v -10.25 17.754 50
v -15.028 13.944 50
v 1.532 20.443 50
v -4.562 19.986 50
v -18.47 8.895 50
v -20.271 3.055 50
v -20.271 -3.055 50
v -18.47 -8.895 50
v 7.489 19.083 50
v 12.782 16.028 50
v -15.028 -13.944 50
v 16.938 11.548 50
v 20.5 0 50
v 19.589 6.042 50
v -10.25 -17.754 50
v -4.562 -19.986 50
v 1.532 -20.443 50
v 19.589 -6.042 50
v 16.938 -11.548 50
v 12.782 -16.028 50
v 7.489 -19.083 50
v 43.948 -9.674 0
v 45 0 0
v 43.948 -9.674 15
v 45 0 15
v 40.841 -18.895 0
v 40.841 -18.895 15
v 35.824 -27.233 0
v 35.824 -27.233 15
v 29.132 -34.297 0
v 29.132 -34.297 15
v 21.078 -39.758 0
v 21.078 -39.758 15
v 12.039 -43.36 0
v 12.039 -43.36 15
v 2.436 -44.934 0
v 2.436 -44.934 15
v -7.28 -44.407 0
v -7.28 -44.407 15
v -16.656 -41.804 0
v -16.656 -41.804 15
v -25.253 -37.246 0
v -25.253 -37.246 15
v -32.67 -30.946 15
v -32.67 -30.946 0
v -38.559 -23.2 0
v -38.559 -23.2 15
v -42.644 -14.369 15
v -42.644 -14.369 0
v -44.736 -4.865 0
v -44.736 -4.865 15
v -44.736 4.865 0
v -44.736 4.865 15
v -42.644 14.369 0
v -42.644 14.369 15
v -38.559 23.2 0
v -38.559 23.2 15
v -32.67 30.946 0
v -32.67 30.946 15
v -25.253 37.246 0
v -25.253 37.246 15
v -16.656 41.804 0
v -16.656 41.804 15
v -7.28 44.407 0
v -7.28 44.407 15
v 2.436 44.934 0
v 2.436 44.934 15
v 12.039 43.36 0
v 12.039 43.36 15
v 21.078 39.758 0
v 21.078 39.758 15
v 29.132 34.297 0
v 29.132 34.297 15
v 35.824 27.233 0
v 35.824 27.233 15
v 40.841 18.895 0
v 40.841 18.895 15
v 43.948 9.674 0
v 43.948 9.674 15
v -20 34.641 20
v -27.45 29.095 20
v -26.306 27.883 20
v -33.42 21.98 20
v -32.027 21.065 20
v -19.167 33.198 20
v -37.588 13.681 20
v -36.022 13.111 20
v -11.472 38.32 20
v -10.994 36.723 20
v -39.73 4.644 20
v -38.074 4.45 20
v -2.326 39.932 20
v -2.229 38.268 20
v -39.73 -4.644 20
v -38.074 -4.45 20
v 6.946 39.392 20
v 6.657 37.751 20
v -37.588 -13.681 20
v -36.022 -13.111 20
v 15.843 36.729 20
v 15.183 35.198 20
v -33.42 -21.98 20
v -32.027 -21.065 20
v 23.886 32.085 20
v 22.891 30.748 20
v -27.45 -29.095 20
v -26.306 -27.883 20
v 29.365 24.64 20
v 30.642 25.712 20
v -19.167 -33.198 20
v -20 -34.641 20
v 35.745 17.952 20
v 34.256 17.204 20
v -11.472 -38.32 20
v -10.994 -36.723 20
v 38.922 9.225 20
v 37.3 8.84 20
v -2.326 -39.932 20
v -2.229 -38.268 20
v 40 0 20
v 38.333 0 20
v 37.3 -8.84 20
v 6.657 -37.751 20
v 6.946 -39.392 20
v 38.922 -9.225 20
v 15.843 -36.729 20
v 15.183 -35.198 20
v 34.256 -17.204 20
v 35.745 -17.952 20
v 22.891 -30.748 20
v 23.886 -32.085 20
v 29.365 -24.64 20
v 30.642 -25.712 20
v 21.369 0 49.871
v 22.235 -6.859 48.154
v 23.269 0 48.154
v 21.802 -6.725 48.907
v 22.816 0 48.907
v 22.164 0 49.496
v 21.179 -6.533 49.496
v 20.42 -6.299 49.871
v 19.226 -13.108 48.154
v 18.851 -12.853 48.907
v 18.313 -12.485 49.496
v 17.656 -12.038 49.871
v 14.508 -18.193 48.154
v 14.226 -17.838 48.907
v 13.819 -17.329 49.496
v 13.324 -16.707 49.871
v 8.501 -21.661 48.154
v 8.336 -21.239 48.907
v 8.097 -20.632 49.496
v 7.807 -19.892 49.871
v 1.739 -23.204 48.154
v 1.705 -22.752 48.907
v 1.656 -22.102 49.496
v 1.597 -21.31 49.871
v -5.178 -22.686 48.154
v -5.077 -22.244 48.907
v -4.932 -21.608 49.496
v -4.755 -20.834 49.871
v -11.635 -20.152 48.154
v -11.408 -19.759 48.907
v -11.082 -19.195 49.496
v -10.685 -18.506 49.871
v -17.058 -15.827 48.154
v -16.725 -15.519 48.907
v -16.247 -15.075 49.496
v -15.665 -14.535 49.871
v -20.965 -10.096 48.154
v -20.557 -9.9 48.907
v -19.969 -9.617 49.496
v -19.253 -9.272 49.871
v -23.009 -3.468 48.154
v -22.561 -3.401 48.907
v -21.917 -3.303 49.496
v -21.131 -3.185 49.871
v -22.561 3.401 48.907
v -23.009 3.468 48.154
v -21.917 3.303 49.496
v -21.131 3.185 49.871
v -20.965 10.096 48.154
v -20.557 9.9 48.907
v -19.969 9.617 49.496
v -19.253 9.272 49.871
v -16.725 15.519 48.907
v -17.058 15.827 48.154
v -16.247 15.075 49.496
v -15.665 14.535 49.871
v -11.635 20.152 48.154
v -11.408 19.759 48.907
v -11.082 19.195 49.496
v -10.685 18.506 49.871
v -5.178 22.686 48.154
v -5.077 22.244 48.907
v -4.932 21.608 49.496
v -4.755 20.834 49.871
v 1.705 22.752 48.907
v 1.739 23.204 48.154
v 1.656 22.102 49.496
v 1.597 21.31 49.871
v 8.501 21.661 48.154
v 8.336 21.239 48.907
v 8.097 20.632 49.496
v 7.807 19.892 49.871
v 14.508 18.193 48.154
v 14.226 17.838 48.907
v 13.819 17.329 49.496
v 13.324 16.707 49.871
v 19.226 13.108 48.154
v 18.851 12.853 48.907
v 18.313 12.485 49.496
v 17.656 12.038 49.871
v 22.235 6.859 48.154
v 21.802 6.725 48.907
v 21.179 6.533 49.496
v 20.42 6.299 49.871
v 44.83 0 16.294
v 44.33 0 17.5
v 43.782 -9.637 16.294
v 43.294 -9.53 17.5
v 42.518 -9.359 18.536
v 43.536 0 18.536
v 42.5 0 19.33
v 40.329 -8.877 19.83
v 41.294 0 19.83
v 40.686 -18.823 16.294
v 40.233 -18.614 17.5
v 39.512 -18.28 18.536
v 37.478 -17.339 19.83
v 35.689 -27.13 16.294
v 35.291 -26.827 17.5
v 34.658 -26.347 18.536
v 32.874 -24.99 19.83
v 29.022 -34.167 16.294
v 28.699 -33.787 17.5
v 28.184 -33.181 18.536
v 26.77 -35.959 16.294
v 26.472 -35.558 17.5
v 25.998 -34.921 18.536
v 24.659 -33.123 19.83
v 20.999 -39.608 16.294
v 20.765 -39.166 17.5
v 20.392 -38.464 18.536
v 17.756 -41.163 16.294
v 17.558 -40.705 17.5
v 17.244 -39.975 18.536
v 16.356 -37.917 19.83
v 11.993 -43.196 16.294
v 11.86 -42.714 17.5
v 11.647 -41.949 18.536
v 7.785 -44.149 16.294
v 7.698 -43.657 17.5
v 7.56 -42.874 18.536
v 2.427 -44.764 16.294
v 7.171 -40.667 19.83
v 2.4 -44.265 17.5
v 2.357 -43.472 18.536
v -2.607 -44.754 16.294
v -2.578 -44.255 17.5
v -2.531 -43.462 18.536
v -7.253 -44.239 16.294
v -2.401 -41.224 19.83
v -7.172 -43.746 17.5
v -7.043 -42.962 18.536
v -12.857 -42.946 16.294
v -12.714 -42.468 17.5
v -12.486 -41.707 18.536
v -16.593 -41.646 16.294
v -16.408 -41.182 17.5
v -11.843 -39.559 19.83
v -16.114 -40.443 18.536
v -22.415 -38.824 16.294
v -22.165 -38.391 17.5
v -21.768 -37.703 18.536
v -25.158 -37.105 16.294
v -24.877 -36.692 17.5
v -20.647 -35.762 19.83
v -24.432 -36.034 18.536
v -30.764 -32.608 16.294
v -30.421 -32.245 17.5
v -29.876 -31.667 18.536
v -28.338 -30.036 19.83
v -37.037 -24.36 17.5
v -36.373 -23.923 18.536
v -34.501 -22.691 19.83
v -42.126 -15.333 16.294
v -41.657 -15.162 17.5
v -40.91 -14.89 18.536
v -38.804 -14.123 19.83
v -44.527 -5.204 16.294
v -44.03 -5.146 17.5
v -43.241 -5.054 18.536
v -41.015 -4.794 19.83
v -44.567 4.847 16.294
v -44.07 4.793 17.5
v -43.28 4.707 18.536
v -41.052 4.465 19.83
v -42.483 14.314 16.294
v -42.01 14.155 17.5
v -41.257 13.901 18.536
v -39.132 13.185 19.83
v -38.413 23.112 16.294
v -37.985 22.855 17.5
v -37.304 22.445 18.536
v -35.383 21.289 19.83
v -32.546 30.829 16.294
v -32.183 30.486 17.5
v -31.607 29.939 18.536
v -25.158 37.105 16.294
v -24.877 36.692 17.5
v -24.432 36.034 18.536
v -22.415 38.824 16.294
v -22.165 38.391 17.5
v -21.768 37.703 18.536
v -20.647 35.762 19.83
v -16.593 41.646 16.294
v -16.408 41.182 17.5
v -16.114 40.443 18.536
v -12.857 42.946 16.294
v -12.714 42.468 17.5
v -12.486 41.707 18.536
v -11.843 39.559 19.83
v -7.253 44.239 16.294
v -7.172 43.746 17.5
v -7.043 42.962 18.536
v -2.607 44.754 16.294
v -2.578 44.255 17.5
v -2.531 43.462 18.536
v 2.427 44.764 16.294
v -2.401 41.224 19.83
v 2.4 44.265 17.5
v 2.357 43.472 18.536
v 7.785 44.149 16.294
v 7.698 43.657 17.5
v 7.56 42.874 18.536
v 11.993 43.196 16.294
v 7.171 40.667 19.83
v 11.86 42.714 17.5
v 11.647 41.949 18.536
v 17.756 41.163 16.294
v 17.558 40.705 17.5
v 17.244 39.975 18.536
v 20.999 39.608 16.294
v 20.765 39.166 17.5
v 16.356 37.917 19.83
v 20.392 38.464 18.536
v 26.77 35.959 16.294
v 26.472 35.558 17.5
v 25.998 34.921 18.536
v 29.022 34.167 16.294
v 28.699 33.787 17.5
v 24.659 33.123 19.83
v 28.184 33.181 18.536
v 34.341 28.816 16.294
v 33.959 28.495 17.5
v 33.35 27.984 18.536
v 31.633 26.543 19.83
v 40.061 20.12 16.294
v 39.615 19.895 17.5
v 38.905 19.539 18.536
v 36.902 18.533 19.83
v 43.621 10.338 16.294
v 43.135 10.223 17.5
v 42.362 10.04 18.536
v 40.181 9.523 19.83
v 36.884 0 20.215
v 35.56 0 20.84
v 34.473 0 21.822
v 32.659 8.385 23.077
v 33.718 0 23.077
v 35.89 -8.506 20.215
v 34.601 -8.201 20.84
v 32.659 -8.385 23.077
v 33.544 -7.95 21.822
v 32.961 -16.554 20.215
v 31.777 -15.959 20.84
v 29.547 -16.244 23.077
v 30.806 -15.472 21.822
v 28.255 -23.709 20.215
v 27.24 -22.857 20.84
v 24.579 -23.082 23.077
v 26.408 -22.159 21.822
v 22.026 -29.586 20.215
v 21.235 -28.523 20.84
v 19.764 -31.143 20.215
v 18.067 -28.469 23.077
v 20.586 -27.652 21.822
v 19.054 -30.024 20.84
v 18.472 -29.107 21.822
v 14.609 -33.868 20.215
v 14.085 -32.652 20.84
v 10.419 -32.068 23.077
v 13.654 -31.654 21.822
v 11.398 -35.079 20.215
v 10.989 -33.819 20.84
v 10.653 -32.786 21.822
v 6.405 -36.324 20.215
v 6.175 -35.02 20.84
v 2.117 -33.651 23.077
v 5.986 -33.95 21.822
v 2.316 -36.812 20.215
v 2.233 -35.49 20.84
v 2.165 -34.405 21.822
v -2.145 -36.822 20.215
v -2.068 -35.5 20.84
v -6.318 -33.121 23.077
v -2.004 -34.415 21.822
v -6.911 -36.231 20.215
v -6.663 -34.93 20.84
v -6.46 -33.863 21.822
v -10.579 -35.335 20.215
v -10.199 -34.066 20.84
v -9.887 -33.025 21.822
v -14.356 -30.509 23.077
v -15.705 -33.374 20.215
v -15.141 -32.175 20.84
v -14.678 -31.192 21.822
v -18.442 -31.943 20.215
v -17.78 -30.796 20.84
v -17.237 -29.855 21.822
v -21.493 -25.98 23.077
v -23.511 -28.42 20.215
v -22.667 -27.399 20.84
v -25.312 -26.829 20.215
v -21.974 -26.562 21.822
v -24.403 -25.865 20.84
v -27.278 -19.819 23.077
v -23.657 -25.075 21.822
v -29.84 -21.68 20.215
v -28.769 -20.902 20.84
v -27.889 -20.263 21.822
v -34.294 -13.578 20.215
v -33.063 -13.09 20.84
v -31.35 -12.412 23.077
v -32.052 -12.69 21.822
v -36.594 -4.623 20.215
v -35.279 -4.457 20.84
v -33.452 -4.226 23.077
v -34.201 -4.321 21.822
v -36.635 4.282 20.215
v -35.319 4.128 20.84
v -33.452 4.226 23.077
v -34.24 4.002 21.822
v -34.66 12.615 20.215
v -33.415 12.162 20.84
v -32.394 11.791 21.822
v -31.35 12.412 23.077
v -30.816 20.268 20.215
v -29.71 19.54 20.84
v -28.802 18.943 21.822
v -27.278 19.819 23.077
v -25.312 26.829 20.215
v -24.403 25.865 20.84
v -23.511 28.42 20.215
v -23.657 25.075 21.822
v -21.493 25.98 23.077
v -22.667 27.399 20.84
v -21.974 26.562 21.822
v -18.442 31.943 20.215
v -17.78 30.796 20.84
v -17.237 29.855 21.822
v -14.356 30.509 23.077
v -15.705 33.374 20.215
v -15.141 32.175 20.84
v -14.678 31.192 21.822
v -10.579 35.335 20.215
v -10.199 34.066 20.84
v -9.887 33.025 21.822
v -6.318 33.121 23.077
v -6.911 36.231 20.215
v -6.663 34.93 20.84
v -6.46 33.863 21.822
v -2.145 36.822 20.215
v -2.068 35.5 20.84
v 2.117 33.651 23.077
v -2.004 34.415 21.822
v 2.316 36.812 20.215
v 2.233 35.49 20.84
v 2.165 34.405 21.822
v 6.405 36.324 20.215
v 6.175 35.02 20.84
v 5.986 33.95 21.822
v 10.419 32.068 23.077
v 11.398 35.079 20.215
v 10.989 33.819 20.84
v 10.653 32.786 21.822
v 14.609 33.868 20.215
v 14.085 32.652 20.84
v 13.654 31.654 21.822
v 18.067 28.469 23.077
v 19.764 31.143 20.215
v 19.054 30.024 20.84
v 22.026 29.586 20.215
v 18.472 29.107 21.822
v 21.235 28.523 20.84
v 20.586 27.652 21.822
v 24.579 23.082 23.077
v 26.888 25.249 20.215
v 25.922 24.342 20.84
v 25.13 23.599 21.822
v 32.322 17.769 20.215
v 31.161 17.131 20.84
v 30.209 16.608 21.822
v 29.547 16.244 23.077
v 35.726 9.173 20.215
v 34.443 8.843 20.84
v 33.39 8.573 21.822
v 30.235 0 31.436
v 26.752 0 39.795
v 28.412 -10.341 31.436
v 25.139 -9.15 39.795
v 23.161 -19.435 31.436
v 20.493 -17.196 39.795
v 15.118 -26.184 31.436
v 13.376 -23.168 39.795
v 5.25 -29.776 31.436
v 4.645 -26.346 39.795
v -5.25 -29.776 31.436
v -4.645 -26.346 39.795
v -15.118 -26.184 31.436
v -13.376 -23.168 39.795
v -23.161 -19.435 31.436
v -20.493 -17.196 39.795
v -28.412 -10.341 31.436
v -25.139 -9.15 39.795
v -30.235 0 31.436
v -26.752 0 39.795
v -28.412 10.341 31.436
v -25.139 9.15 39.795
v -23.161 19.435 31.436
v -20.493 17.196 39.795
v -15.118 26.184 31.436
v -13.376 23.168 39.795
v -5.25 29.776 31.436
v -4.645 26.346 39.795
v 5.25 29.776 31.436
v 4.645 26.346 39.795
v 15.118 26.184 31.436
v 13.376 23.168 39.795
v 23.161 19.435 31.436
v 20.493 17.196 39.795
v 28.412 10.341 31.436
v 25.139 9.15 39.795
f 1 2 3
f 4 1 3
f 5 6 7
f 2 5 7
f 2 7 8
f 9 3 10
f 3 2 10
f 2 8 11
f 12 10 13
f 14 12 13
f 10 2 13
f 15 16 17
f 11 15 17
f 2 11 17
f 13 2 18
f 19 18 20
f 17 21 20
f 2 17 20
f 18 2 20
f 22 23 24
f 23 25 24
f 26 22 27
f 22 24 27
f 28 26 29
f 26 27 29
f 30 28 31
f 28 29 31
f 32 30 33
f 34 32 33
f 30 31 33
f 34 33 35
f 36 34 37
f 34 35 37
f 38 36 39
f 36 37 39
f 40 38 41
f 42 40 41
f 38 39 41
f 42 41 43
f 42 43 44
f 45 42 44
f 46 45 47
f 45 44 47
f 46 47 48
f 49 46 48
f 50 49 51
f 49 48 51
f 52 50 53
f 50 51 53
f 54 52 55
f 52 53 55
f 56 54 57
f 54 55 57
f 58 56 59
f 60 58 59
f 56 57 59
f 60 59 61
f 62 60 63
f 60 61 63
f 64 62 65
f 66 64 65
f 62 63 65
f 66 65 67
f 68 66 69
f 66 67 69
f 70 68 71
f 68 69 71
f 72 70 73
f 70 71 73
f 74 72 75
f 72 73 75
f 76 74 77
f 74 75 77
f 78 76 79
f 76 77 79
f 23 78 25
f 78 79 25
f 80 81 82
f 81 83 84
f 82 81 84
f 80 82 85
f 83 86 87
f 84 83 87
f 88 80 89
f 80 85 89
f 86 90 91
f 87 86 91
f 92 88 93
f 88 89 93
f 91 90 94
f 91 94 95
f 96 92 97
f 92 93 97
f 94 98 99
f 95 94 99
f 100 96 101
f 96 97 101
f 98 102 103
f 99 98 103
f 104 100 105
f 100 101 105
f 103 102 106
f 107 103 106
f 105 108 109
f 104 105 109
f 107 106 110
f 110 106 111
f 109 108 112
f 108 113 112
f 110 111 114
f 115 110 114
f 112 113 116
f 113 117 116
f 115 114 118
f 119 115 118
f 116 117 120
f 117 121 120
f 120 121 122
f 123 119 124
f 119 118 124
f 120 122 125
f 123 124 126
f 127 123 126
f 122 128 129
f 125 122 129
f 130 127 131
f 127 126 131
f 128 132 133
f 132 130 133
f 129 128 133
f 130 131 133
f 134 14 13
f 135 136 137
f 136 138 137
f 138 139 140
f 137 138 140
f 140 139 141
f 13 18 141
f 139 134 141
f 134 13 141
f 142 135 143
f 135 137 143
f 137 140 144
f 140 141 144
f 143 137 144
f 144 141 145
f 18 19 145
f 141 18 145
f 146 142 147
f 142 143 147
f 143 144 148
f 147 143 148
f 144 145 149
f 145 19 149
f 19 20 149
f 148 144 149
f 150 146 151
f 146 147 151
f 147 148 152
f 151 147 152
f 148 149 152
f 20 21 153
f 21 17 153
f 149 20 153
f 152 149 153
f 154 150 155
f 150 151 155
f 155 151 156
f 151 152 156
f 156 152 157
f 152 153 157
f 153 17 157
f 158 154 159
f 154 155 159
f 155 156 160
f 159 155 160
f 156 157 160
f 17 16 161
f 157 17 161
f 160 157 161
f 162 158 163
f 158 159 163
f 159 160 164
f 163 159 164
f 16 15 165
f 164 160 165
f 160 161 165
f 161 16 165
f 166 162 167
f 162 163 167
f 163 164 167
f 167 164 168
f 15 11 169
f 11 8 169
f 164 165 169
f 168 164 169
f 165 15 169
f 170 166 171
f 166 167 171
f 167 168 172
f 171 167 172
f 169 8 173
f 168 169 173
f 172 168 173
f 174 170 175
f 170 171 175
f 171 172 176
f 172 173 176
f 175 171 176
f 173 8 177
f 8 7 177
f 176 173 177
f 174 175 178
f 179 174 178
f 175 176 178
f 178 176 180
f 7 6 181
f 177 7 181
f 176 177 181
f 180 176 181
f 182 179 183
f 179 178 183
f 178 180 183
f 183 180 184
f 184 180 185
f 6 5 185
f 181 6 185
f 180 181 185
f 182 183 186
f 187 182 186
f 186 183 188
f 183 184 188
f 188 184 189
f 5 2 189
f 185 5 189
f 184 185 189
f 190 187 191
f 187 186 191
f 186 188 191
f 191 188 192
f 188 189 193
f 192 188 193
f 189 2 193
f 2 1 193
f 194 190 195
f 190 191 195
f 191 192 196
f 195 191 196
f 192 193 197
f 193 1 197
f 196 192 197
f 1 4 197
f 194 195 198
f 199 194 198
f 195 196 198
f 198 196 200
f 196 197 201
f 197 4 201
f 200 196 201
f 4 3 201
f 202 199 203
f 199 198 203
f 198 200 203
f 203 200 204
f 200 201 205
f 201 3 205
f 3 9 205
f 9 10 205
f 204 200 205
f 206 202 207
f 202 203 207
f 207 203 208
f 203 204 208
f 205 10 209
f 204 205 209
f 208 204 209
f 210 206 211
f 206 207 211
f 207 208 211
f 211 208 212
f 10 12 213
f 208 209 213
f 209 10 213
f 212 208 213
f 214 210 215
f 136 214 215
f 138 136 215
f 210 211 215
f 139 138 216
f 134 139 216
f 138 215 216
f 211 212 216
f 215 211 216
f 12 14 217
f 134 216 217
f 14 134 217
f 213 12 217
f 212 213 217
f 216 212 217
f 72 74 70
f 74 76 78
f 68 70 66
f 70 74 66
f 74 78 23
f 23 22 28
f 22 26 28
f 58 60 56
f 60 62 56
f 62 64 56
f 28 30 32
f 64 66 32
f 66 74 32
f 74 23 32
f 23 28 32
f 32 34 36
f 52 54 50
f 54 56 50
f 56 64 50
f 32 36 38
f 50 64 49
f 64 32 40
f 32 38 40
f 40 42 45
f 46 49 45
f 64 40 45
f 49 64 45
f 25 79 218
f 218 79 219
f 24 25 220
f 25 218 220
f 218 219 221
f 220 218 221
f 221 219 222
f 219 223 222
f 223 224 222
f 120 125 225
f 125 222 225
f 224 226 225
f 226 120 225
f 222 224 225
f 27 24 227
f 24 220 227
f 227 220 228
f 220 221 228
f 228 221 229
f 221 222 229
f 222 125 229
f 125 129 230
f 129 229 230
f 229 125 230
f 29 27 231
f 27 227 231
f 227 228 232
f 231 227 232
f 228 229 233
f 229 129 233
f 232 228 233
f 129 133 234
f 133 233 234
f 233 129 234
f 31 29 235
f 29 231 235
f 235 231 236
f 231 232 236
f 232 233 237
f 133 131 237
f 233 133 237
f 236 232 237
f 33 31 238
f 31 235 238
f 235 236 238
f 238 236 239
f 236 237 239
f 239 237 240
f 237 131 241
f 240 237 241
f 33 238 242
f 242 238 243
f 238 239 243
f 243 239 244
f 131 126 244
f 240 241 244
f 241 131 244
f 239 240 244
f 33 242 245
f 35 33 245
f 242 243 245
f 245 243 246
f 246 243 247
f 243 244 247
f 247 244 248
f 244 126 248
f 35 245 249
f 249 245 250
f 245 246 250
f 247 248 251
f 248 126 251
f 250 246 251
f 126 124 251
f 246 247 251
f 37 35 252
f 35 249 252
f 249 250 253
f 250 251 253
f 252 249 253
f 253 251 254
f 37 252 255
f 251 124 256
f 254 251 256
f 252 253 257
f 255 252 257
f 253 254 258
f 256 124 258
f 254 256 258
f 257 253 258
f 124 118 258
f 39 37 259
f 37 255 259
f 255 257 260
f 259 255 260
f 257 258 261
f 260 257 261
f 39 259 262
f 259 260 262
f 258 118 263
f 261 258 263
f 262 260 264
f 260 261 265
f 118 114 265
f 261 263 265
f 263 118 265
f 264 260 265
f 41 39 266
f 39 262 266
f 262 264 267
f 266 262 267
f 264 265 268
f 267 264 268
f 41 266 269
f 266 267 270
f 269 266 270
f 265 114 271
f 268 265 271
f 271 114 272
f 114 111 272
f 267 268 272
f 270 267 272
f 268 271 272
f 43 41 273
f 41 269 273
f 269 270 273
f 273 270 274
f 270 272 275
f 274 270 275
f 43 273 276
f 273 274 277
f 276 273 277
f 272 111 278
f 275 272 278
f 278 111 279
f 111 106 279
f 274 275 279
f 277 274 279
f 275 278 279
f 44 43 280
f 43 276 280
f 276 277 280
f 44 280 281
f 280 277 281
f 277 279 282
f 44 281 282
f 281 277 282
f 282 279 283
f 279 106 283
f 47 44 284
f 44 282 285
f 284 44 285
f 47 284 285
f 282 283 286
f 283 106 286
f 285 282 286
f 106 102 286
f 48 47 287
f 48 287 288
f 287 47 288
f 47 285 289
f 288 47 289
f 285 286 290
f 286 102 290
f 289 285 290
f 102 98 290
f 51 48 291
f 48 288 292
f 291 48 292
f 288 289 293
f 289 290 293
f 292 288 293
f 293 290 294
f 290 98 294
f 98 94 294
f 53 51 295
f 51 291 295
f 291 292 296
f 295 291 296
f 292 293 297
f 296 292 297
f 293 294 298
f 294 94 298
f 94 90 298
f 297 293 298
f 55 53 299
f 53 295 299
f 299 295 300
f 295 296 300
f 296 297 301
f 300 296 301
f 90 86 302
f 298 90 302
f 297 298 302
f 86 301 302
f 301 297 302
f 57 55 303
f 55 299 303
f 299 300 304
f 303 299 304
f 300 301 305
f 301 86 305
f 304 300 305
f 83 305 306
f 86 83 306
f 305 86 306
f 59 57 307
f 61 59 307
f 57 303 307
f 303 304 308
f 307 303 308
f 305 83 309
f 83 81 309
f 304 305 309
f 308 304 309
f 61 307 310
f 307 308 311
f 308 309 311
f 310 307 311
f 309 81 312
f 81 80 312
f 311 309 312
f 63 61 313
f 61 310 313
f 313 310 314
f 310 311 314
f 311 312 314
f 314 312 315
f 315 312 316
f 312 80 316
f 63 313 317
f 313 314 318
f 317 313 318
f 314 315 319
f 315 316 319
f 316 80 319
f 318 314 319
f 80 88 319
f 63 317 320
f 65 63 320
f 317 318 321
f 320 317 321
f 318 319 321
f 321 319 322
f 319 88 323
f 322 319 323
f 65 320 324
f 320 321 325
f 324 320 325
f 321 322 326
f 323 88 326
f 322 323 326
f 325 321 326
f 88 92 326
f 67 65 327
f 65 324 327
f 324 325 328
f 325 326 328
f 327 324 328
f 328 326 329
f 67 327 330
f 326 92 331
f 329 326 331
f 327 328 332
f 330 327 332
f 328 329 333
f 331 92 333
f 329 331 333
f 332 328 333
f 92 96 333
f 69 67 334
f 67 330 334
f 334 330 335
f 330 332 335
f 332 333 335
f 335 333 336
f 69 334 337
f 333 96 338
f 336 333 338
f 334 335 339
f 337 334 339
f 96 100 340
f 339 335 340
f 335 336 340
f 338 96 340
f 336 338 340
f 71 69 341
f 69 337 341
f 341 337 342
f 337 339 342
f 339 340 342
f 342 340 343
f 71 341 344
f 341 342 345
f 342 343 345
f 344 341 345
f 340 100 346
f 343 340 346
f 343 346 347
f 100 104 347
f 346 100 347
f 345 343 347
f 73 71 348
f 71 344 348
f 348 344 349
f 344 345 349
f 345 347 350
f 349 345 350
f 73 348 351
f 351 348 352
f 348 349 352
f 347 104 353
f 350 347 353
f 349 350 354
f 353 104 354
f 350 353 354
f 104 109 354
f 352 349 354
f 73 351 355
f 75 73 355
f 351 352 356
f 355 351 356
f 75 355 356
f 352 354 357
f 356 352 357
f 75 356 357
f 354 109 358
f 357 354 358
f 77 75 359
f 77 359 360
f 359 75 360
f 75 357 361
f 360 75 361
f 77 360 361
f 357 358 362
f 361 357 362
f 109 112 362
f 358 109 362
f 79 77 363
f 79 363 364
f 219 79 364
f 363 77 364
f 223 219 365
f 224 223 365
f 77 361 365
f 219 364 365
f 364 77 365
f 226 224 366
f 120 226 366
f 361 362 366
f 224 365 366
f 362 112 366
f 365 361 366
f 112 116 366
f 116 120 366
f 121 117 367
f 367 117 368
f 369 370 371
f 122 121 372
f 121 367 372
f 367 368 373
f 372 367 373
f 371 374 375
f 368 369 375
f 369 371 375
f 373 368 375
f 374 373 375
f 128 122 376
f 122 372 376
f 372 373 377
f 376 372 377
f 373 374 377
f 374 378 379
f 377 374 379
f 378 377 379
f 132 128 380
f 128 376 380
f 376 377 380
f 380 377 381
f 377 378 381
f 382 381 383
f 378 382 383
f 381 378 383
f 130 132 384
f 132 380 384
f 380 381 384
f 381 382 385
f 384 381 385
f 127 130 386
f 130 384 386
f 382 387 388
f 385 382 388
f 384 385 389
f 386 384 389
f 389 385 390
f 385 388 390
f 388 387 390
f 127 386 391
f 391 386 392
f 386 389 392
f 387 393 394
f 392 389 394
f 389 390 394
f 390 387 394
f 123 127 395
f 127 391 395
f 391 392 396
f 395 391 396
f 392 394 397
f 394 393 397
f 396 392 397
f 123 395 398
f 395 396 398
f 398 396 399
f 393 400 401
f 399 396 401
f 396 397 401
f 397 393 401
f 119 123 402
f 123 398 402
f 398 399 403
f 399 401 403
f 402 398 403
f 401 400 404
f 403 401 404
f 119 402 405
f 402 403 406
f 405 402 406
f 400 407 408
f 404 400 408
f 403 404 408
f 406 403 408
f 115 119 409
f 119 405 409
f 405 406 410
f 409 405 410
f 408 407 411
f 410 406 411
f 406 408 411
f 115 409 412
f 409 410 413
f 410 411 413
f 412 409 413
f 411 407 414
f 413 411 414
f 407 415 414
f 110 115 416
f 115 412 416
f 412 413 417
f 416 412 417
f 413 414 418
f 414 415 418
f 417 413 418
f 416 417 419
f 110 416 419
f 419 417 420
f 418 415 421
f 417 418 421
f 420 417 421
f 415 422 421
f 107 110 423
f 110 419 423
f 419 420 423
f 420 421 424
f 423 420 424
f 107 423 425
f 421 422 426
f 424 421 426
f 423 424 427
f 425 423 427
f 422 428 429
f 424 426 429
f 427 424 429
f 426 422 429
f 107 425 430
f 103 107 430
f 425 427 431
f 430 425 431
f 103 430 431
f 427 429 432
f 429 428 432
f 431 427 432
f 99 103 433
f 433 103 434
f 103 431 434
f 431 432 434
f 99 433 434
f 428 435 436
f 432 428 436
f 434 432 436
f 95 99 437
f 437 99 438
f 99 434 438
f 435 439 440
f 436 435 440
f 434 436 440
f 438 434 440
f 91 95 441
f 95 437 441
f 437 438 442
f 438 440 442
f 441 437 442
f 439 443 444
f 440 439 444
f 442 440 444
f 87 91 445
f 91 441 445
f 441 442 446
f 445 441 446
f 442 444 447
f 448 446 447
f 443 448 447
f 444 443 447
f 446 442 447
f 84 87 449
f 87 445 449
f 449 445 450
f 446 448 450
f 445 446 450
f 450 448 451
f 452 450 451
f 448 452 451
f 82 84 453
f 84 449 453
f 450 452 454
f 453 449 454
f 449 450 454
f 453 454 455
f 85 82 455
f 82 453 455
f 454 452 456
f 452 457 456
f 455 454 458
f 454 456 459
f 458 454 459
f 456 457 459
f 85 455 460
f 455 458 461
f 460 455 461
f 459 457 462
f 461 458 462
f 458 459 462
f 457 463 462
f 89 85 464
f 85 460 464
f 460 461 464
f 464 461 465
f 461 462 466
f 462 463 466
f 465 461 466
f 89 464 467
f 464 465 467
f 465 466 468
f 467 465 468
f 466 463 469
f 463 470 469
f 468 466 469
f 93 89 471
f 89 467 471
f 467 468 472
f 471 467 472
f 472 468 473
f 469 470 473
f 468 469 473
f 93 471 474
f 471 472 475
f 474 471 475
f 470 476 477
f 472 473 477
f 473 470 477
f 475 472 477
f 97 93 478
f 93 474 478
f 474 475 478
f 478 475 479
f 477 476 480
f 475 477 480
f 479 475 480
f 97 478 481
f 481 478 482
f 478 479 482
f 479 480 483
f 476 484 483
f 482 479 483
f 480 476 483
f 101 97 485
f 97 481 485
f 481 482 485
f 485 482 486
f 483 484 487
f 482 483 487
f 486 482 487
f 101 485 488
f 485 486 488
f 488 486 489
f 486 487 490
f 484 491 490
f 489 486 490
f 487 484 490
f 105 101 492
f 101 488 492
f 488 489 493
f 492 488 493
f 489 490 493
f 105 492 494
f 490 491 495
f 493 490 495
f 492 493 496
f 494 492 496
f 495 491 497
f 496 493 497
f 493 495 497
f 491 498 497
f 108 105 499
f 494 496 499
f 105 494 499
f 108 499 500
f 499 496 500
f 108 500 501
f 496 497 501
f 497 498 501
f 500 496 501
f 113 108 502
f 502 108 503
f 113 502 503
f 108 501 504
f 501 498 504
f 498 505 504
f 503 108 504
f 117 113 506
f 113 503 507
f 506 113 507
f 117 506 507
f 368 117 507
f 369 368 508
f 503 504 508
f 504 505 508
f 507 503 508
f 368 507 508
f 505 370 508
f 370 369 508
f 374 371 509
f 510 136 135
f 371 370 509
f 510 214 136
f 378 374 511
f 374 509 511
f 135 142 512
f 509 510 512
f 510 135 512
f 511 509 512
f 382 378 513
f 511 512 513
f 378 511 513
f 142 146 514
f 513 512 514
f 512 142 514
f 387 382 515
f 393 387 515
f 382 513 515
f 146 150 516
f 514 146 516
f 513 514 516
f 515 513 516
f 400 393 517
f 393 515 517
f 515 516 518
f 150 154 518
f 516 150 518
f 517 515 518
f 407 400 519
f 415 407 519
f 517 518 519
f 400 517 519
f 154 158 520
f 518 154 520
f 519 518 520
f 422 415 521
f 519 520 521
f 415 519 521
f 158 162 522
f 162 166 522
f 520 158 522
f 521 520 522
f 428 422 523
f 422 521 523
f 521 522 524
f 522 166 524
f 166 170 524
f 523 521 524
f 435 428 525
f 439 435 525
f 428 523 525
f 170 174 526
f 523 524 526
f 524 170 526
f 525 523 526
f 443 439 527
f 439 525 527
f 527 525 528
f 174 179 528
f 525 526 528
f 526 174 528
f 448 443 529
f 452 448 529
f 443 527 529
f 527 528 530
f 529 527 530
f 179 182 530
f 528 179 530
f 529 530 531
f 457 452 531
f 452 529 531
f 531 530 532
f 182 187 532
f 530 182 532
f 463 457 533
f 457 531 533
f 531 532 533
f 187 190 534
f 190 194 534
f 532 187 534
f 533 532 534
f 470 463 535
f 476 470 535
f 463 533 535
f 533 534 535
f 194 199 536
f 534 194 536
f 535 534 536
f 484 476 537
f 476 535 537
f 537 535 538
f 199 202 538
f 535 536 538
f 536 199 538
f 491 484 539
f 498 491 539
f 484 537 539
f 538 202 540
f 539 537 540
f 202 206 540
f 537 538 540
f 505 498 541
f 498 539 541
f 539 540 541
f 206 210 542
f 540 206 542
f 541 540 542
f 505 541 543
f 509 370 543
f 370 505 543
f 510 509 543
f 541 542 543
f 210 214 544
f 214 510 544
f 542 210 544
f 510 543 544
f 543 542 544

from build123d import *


with BuildPart() as f1:
    # F0 (on Front) → F1 (revolve)
    with BuildSketch(Plane.XZ):
        with BuildLine():
            Line((20.5, 50), (0, 50))
            Line((0, 50), (0, 0))
            Line((0, 0), (45, 0))
            Line((45, 0), (45, 15))
            ThreePointArc((45, 15), (43.535534, 18.535534), (40, 20))
            Line((40, 20), (38.333333, 20))
            ThreePointArc((38.333333, 20), (35.559832, 20.839749), (33.717949, 23.076923))
            Line((33.717949, 23.076923), (23.269231, 48.153846))
            ThreePointArc((23.269231, 48.153846), (22.164101, 49.496151), (20.5, 50))
        make_face()
    revolve(axis=Axis((0, 0, 11.951942), (0, 0, -1)))


solid = f1.part
